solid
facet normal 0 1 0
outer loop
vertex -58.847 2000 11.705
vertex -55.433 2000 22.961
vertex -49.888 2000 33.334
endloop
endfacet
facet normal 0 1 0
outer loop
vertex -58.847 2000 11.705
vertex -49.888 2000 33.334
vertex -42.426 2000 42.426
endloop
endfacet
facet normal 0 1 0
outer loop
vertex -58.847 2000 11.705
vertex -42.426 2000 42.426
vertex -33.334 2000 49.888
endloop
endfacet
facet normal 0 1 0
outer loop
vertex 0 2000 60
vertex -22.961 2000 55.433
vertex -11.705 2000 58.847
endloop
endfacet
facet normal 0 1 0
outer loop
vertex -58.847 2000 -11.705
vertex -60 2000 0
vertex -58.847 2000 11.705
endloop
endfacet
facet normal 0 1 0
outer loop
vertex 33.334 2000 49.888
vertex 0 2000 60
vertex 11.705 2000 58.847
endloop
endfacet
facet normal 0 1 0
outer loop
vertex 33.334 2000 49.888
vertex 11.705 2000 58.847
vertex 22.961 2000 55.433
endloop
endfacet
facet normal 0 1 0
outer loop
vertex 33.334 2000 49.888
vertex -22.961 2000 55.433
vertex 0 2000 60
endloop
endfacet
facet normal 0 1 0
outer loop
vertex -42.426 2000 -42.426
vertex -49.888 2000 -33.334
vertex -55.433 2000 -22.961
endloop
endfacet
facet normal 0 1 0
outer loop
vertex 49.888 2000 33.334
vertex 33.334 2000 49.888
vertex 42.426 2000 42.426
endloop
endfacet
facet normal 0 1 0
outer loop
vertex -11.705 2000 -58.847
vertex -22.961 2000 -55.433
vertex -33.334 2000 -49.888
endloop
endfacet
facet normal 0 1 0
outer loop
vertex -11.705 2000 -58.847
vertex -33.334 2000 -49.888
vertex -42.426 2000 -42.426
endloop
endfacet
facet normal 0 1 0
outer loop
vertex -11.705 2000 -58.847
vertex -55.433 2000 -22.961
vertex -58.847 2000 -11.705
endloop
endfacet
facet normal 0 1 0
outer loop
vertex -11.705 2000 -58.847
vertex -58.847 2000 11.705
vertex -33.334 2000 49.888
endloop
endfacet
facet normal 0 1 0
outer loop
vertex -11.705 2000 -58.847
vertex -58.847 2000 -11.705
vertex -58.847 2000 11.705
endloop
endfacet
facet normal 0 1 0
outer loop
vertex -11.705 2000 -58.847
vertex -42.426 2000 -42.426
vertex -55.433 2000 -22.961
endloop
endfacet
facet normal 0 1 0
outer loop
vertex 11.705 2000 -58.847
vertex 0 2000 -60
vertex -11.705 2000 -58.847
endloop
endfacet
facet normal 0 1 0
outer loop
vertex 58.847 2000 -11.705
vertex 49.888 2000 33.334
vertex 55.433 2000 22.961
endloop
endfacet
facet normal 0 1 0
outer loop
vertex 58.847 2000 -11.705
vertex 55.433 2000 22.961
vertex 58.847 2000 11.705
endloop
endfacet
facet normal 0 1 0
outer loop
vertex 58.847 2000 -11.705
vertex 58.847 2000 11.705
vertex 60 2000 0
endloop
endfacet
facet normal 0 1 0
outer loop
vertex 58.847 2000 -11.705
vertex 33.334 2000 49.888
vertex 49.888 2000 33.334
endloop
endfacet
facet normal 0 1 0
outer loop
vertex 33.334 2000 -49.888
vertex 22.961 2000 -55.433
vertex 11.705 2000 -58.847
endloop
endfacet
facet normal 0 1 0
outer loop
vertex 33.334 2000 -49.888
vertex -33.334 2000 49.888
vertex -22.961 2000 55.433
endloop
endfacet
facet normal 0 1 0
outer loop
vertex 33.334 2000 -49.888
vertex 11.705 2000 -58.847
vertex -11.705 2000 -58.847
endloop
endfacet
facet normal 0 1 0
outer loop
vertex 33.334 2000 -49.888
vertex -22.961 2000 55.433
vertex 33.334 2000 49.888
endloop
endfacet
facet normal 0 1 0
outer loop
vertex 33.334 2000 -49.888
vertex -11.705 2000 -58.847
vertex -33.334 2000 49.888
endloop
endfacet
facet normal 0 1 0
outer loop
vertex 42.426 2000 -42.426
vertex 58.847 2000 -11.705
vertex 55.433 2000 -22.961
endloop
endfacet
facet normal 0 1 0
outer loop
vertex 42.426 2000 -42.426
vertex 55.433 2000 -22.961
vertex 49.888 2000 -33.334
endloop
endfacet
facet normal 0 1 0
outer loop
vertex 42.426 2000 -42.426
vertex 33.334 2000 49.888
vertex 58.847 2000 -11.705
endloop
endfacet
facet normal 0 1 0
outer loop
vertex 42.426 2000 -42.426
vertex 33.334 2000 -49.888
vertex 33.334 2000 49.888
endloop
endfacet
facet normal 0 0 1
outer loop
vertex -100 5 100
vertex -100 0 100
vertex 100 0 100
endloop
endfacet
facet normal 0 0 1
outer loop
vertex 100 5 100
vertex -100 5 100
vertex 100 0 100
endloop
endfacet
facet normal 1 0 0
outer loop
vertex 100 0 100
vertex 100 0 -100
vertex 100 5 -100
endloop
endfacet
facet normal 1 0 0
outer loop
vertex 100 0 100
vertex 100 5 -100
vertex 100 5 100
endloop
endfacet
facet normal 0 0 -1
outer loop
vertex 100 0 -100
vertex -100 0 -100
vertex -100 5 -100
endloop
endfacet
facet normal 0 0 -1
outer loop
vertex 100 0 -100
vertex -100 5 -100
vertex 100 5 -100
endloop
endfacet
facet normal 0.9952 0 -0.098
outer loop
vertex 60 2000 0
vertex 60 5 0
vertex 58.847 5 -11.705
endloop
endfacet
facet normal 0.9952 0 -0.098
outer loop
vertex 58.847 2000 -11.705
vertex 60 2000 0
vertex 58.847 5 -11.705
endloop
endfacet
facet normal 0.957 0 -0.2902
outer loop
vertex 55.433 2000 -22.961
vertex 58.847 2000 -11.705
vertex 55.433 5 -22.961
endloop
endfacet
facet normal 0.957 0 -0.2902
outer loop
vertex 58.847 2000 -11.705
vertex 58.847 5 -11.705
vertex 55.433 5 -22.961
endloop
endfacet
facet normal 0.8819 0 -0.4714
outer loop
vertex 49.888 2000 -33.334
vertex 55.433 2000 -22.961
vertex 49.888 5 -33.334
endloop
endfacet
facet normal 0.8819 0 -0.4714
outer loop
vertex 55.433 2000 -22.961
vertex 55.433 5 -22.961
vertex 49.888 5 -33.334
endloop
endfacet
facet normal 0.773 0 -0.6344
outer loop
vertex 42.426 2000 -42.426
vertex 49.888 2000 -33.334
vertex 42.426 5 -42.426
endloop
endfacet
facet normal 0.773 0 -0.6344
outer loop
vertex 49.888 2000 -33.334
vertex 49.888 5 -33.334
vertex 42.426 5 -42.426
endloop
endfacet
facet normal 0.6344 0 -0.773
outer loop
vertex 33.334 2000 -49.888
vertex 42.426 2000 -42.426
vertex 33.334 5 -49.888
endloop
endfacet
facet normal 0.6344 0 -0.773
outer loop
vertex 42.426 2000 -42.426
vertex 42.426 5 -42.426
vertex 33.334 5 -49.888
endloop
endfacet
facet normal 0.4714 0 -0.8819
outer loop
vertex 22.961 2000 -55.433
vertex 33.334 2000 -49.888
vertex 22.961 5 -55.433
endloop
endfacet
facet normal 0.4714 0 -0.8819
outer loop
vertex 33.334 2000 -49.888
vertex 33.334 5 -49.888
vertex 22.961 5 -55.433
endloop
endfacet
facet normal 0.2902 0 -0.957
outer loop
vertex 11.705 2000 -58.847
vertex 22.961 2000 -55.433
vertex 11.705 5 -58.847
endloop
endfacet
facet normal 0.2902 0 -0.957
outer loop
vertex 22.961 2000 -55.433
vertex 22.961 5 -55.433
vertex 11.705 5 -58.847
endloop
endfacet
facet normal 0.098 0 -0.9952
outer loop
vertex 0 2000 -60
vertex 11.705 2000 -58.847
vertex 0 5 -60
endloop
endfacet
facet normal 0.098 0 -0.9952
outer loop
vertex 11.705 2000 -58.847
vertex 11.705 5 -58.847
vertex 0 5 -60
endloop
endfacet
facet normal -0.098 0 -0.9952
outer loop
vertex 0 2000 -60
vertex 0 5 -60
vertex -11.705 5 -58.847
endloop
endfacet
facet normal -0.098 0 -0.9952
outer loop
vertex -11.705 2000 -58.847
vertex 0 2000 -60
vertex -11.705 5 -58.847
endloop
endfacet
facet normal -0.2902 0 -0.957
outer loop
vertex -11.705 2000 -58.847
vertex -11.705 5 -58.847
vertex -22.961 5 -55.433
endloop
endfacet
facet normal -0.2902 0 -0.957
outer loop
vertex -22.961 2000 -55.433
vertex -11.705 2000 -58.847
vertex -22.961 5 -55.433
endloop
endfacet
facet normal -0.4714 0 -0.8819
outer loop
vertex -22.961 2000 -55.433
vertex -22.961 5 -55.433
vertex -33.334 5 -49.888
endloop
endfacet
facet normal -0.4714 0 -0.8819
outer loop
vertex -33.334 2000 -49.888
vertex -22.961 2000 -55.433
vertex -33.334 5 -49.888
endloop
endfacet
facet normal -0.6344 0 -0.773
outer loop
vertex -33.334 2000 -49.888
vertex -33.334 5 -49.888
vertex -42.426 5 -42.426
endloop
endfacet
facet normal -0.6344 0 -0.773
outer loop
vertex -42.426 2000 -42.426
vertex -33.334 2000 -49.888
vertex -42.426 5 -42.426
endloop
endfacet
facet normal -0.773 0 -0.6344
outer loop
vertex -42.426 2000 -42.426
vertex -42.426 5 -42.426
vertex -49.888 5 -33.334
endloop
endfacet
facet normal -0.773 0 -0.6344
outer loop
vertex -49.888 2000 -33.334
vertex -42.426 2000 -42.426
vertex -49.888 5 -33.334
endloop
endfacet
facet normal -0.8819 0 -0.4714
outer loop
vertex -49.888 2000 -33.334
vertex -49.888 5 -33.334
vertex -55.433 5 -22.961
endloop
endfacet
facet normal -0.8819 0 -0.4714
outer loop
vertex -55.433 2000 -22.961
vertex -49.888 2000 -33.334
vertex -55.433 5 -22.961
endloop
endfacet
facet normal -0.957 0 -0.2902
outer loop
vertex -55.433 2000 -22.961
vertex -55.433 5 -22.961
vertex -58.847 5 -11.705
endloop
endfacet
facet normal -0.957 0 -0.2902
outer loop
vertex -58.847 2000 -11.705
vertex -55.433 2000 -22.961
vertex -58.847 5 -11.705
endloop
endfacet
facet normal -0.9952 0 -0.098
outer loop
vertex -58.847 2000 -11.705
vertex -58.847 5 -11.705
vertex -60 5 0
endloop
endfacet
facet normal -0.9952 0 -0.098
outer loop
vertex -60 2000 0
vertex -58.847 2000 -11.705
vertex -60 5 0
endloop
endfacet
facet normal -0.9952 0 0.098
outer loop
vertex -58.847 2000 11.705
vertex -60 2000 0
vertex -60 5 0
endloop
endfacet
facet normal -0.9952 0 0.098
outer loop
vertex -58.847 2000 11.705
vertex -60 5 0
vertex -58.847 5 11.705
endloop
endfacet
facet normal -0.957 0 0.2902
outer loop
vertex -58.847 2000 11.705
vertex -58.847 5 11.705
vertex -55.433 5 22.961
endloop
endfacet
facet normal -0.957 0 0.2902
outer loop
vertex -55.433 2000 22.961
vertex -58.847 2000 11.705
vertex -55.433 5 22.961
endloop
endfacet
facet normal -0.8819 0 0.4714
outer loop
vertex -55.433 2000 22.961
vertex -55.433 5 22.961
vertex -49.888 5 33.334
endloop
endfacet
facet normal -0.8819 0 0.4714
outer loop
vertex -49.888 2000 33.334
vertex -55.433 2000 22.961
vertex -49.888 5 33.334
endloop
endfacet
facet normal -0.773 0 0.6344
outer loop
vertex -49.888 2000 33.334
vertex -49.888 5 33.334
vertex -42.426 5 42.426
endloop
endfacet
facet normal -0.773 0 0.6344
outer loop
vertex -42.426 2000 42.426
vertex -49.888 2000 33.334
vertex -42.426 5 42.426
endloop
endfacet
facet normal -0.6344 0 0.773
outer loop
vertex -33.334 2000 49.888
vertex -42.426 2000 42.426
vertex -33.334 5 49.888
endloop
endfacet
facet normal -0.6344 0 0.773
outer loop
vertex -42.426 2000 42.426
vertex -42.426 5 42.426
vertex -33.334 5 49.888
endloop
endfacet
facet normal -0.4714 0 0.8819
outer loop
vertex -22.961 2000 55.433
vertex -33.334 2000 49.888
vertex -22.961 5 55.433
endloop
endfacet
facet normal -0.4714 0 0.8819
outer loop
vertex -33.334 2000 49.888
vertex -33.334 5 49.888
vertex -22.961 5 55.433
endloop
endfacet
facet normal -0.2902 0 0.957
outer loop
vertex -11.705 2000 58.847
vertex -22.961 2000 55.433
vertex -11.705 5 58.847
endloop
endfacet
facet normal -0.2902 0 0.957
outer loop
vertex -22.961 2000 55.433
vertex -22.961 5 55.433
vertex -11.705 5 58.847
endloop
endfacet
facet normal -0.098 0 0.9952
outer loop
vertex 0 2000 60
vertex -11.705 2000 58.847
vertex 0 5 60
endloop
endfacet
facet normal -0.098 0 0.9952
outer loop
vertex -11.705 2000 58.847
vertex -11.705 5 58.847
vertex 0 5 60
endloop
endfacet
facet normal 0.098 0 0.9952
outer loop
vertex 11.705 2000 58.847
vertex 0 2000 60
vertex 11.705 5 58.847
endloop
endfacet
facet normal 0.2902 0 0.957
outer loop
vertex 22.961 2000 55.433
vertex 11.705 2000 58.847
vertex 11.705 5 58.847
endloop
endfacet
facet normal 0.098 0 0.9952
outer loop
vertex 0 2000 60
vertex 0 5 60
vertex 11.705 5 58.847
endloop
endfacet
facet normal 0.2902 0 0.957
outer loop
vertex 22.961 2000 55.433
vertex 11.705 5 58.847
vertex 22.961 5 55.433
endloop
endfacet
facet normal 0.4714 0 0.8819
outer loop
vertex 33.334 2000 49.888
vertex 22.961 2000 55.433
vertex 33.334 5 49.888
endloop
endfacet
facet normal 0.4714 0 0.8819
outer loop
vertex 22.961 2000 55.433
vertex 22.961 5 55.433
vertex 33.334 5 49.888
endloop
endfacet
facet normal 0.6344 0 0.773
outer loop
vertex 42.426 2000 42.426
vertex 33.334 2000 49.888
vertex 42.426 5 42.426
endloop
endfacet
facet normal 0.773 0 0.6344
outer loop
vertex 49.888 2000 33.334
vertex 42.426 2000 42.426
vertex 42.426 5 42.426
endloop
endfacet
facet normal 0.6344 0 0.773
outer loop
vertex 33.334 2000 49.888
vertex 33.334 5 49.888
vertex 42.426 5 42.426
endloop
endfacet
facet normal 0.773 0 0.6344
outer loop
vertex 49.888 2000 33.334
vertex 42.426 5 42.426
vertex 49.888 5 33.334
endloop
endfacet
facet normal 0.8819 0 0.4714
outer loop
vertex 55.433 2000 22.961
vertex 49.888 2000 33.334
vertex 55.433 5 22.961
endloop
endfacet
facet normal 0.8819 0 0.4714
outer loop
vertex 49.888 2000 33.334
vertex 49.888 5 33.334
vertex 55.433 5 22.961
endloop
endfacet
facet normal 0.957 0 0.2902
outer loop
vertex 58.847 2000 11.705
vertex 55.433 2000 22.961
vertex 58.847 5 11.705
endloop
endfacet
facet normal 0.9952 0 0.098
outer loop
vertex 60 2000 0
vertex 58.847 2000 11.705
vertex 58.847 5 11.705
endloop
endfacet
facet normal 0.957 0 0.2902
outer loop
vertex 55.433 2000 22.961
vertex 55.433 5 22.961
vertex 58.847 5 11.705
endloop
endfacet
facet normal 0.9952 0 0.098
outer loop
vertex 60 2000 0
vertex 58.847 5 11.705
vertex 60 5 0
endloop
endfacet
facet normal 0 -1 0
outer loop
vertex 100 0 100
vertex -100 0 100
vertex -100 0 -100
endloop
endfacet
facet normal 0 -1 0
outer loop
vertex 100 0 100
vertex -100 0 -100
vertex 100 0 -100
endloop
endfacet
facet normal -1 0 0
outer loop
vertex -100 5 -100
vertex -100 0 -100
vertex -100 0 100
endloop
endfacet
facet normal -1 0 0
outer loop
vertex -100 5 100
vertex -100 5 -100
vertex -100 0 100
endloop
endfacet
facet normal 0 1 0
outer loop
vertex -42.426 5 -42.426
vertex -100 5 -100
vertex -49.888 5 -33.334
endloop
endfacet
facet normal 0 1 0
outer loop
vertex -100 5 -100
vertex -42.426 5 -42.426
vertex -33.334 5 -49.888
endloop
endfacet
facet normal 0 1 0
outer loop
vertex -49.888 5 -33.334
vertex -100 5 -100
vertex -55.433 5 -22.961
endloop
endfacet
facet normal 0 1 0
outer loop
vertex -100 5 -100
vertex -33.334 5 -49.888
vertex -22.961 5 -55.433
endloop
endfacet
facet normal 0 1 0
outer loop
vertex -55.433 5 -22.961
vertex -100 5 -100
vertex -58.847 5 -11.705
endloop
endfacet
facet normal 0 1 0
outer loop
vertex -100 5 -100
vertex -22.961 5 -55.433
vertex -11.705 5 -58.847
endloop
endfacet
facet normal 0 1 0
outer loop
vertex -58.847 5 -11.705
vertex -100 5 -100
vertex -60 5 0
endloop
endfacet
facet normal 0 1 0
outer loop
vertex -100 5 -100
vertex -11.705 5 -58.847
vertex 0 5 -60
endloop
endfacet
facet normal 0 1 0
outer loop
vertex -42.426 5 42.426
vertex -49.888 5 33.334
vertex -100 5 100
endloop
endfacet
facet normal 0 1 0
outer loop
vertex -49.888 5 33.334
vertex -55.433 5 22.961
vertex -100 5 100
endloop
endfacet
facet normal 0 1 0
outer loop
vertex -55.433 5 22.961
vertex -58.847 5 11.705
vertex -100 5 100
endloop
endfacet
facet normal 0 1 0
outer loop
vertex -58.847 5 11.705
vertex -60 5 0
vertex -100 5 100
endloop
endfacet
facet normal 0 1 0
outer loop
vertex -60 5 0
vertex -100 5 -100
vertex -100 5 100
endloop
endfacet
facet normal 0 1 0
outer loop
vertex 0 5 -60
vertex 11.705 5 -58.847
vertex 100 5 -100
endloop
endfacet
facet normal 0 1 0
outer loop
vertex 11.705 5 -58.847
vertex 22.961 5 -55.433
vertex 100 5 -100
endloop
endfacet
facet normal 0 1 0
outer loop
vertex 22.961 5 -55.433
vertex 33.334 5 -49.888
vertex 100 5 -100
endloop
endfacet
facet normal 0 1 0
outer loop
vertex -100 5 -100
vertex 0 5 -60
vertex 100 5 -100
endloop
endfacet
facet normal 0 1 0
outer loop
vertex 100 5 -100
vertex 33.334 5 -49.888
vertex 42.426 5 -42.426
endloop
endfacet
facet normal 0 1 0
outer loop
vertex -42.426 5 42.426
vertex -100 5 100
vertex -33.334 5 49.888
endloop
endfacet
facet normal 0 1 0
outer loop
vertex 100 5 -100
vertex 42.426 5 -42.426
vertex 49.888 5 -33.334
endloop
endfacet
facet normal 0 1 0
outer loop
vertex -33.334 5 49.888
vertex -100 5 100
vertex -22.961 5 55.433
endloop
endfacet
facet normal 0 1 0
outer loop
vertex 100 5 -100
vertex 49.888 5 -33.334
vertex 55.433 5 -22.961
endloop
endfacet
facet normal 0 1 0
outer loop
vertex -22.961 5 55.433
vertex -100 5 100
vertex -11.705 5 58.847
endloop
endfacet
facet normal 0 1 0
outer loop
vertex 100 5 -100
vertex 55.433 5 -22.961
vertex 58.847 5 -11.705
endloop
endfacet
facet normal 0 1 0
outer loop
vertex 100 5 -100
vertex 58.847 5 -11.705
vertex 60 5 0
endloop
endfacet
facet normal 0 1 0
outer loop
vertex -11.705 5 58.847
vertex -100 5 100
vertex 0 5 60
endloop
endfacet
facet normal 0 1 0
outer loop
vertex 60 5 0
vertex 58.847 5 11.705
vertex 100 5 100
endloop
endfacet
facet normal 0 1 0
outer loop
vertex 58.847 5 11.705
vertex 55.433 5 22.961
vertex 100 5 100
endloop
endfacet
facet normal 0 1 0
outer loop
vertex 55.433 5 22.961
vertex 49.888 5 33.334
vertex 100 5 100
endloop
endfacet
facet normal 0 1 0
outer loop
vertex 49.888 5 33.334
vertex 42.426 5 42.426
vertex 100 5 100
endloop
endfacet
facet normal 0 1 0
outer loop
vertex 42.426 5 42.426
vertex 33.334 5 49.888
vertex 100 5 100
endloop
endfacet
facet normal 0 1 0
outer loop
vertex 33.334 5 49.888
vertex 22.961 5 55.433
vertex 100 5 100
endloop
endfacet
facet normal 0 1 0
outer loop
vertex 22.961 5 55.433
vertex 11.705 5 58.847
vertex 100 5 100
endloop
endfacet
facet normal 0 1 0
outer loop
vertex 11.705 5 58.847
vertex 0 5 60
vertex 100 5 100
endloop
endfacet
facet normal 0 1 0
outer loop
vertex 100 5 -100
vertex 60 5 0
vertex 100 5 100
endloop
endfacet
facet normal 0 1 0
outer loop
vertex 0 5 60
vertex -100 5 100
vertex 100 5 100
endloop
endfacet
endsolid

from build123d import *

# Parameters (mm, degrees)
SKETCH_1_R      = 60
EXTRUDE_1_DEPTH = 2000
SKETCH_2_W      = 200
SKETCH_2_H      = 200
EXTRUDE_2_DEPTH = 5


with BuildPart() as part:
    # 草圖1 → 填料-伸長1 (new body)
    with BuildSketch(Plane(origin=(0, 0, 0), x_dir=(1, 0, 0), z_dir=(0, 1, 0))):
        Circle(SKETCH_1_R)
    extrude(amount=EXTRUDE_1_DEPTH)

    # 草圖2 → 填料-伸長2 (add)
    with BuildSketch(Plane.XZ):
        Rectangle(SKETCH_2_W, SKETCH_2_H)
    extrude(amount=-EXTRUDE_2_DEPTH)


solid = part.part
